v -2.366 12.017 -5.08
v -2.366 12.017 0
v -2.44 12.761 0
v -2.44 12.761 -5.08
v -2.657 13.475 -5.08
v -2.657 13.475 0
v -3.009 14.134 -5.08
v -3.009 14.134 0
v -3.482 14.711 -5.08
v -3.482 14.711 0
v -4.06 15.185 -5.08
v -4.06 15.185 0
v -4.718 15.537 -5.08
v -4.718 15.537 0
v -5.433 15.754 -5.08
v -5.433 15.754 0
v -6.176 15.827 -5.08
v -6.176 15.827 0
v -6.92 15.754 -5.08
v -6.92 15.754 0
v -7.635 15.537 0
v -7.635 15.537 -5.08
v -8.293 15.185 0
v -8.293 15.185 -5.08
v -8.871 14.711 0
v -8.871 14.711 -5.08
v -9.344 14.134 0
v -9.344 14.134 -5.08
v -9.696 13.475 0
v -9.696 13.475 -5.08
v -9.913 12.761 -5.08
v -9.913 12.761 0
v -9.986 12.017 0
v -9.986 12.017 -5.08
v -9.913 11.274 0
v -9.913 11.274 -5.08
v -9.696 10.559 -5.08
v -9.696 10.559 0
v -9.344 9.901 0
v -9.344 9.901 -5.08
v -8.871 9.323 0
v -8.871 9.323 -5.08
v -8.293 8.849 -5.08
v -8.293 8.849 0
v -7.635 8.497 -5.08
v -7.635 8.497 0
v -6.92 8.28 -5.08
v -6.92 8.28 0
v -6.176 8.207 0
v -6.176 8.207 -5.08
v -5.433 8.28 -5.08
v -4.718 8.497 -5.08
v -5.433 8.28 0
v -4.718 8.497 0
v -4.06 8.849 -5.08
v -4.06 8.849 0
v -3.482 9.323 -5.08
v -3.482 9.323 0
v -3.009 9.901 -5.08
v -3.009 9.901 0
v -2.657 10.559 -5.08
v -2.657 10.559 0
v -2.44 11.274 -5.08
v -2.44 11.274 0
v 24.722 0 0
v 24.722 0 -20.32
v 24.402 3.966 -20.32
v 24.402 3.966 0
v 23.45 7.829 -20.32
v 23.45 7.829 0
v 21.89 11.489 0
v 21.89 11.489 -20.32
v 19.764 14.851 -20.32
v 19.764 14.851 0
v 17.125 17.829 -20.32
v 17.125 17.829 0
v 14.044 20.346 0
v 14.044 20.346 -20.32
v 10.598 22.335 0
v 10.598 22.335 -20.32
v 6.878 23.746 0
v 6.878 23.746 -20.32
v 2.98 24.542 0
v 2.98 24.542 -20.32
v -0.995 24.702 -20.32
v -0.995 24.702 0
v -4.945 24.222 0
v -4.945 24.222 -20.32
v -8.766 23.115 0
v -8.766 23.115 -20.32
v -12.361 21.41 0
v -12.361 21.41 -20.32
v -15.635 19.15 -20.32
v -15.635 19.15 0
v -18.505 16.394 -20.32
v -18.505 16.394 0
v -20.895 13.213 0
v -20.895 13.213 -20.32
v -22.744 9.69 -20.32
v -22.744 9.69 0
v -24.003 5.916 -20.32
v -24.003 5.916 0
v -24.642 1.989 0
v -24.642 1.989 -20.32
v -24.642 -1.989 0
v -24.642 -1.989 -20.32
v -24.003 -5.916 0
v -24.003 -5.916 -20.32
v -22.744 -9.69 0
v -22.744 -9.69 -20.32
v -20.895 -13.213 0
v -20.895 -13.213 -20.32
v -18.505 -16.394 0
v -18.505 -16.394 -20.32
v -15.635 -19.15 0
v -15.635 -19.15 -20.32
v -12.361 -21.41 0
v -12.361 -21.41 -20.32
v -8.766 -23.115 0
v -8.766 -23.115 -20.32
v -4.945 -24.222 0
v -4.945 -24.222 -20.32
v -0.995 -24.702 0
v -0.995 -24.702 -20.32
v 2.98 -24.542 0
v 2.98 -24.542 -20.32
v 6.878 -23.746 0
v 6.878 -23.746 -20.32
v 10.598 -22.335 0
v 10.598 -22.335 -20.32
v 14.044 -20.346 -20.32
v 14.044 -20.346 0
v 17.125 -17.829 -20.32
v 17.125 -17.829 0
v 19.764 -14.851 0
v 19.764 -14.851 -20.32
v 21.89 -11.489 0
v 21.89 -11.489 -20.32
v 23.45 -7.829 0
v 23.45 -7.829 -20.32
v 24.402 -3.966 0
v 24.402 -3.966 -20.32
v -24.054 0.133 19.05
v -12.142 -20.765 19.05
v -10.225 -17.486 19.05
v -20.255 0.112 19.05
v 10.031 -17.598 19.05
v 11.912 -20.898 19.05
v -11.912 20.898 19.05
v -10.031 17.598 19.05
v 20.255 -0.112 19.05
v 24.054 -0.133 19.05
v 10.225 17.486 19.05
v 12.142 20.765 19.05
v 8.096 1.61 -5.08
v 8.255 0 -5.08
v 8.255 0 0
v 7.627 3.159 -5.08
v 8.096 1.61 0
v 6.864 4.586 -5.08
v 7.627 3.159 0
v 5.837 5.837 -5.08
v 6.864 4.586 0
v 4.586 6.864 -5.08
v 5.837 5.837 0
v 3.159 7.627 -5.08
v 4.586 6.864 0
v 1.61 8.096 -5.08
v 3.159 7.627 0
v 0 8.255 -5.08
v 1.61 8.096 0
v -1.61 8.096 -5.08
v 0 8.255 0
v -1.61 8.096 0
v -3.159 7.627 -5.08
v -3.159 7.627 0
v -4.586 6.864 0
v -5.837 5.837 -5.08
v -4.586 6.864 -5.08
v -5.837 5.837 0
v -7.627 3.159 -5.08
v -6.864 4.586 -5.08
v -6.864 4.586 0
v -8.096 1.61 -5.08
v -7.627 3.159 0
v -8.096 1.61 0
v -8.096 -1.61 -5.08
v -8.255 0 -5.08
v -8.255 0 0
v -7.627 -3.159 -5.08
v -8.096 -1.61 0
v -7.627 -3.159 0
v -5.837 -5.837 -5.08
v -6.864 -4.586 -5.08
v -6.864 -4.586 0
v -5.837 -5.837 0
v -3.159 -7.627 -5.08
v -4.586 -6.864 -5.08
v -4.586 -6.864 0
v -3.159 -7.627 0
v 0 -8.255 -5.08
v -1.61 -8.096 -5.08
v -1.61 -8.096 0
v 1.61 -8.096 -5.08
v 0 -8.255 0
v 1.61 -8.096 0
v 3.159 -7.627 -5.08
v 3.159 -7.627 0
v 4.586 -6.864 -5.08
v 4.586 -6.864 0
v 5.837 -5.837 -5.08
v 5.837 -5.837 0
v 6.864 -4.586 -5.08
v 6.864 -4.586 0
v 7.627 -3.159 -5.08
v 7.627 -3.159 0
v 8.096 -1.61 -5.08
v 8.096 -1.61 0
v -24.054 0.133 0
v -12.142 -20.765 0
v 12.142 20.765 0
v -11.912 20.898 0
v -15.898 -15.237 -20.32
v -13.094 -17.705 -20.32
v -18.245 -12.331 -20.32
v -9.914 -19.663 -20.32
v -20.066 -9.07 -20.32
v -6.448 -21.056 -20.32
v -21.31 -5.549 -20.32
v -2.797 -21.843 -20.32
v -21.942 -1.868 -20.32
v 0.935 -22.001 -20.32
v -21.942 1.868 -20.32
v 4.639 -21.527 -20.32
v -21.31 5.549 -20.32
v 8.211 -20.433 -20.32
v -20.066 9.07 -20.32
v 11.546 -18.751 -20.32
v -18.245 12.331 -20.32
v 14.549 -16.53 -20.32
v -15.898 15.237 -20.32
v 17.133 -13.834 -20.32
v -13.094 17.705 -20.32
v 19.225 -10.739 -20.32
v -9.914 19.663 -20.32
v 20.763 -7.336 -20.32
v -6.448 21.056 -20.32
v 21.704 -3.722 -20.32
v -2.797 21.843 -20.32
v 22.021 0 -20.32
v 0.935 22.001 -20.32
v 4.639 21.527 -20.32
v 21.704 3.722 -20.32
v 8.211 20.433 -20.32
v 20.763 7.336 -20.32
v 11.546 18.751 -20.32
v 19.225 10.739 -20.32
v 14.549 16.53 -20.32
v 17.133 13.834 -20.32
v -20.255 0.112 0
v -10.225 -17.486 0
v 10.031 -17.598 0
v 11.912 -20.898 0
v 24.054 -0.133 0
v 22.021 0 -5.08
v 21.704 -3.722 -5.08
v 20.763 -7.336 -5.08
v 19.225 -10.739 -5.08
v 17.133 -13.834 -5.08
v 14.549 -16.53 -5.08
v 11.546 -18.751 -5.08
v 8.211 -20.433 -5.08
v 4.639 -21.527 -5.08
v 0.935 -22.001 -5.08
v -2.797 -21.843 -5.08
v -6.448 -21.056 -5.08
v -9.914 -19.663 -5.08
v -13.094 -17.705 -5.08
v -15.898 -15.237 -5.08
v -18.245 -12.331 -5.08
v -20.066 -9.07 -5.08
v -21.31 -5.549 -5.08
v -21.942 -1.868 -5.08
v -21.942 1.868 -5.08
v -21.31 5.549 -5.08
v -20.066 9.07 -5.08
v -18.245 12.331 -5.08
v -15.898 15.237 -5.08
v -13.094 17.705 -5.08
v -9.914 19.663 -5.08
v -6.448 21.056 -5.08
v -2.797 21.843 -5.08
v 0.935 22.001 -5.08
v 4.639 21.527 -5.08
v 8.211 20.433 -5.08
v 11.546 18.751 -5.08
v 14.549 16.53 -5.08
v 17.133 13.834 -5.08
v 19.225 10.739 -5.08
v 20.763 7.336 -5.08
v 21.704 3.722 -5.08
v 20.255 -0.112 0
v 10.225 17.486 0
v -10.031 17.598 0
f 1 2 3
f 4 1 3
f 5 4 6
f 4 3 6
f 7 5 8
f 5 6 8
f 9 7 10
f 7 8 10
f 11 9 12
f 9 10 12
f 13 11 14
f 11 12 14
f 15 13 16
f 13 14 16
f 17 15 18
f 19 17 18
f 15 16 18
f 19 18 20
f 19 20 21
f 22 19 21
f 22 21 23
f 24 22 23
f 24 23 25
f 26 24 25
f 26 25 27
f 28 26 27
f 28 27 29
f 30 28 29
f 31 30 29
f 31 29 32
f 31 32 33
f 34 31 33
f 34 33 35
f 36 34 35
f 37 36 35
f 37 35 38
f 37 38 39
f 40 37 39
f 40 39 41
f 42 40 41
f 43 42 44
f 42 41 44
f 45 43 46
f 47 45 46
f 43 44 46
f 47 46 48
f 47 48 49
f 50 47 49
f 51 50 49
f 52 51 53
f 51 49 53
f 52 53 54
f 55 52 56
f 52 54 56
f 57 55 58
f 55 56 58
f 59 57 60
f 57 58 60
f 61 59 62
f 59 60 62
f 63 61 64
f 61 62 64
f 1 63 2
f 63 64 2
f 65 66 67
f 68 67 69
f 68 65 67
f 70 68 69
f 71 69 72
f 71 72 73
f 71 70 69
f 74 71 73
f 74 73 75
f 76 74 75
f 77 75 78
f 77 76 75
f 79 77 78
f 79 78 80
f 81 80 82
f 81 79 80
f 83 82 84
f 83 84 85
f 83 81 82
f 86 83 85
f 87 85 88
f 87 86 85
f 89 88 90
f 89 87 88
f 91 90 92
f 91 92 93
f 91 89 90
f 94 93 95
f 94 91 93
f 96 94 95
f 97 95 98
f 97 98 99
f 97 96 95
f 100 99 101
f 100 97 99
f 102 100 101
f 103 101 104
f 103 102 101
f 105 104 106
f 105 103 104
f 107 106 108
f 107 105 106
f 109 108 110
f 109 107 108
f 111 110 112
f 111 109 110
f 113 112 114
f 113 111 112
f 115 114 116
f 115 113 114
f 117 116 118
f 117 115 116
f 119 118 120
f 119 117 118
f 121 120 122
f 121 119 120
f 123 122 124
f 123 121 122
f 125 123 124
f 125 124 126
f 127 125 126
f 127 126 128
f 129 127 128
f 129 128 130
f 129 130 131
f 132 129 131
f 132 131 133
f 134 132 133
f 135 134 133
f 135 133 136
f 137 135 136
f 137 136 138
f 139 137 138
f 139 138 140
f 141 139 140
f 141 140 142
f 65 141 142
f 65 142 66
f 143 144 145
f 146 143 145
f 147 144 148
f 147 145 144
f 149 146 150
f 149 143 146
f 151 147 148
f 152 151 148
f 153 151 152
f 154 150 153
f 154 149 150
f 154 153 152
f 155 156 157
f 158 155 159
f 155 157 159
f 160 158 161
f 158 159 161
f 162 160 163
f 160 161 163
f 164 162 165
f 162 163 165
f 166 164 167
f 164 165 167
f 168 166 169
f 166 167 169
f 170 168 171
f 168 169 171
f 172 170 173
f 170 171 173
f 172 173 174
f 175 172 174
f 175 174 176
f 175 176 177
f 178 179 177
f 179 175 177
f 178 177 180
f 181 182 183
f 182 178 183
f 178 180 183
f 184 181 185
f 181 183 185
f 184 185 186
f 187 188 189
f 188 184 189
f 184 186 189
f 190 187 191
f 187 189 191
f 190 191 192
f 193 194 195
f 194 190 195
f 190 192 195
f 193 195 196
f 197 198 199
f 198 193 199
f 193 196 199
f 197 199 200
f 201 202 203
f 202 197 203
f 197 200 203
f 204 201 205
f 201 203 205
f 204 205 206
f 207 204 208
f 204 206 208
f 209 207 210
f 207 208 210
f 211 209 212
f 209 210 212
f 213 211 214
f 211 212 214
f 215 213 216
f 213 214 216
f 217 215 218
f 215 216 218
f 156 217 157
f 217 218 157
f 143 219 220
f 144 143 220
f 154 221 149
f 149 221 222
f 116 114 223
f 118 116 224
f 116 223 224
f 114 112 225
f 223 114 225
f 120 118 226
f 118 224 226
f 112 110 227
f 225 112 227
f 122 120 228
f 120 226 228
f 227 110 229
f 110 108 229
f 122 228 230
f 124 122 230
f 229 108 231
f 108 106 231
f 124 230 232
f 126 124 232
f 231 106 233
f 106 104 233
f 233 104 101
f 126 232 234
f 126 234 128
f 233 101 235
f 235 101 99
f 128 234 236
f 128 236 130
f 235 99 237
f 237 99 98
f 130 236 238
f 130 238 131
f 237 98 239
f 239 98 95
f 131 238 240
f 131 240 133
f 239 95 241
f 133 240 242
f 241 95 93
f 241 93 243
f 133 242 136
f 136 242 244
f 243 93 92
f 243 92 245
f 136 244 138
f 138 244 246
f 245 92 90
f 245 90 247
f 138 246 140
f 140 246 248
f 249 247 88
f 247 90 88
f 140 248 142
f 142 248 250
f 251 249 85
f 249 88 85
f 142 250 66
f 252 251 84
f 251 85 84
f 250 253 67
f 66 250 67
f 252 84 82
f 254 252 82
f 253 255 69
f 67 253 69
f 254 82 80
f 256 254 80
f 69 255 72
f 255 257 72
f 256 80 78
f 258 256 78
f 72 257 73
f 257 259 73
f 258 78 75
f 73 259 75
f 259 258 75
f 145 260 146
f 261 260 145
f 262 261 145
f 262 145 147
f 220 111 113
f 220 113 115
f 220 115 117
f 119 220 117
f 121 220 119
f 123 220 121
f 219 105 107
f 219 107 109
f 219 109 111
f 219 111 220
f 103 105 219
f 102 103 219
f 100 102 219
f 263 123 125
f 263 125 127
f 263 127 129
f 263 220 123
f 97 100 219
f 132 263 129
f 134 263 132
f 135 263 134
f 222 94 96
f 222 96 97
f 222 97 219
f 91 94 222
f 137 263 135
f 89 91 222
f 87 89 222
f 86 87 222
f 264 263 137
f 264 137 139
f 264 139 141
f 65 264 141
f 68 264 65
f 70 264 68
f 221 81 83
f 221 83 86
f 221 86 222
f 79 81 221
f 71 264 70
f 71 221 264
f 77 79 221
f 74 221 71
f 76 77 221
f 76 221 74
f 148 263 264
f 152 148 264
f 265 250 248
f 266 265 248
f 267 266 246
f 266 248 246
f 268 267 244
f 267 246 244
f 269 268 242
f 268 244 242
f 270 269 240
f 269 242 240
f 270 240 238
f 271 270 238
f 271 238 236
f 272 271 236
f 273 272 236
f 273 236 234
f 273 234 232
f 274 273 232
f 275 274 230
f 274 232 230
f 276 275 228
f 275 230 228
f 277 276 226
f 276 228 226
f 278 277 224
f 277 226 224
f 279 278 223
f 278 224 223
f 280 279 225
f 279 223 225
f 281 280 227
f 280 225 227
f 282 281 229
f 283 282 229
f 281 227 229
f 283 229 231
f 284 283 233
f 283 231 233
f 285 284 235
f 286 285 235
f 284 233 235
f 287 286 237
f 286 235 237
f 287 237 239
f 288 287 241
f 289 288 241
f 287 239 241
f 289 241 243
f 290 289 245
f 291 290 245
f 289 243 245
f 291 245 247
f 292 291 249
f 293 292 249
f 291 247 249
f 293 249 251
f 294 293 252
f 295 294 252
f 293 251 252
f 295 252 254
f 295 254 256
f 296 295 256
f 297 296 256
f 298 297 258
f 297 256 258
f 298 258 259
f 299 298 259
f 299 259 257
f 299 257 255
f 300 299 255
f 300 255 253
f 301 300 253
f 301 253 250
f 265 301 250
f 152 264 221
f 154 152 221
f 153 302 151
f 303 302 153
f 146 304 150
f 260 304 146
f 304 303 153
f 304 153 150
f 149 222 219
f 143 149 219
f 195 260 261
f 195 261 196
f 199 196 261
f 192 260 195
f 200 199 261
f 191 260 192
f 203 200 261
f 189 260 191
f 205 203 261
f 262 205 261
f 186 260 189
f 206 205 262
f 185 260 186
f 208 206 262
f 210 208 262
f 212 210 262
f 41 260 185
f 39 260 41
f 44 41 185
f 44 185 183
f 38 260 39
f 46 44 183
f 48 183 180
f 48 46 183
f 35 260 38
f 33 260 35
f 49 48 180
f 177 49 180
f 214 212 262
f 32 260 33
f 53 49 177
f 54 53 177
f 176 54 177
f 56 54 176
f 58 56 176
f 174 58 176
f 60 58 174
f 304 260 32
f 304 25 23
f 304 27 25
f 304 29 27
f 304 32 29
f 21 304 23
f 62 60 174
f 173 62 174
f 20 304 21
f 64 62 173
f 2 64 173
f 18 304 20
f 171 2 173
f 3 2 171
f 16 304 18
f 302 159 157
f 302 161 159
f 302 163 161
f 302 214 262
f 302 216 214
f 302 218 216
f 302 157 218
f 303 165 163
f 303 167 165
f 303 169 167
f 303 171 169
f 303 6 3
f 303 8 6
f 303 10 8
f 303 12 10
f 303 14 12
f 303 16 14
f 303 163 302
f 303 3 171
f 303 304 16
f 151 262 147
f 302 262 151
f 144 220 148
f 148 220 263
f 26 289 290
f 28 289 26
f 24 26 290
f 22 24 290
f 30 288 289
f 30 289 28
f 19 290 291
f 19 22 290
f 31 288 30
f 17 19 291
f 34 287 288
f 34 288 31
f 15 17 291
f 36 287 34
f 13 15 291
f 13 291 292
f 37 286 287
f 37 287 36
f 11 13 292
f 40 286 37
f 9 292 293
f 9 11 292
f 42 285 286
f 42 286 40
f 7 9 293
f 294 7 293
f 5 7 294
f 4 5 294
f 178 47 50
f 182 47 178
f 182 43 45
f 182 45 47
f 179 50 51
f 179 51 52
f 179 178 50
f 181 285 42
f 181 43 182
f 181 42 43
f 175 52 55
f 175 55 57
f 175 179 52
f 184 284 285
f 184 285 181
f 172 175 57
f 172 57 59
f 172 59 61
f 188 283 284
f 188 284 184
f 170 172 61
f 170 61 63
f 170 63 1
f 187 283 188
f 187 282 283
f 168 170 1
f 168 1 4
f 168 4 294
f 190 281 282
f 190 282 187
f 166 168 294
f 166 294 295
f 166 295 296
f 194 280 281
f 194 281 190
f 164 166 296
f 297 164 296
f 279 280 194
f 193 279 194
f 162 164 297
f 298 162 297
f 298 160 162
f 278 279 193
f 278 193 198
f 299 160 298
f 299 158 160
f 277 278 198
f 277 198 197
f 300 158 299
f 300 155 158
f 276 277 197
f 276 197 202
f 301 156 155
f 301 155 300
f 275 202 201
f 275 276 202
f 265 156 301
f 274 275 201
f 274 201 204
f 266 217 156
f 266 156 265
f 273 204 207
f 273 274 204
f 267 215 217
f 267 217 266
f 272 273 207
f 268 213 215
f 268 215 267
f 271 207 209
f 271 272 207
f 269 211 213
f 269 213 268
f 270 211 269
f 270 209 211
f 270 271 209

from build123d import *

# Parameters (mm, degrees)
F2_DEPTH  = 19.05
F3_DEPTH  = 67.818
F4_R      = 24.7218142408
F5_DEPTH  = 2.54
F6_R      = 8.255
F7_DEPTH  = 60.706
F8_DEPTH  = 17.78
F9_R      = 22.0208797998
F9_R_2    = 8.255
F10_DEPTH = 15.24
F11_R     = 3.81
F12_DEPTH = 25.4


with BuildPart() as f2:
    # F0 (on Top) → F2 (new body)
    with BuildSketch(Plane.XY):
        Polygon((11.9120152821, -20.8982058203), (24.0543847749, -0.1329950655), (12.1423694928, 20.7652107547), (-11.9120152821, 20.8982058203), (-24.0543847749, 0.1329950655), (-12.1423694928, -20.7652107547), align=None)
    extrude(amount=F2_DEPTH)

    # F1 (on face) → F3 (cut)
    with BuildSketch(Plane.XY):
        Polygon((20.2553256916, -0.1120183326), (10.2246735675, 17.4856174446), (-10.0306521241, 17.5976357771), (-20.2553256916, 0.1120183326), (-10.2246735675, -17.4856174446), (10.0306521241, -17.5976357771), align=None)
    extrude(amount=F3_DEPTH, mode=Mode.SUBTRACT)

    # F4 (on Top) → F5 (join)
    with BuildSketch(Plane.XY):
        Circle(F4_R)
    extrude(amount=-F5_DEPTH)

    # F6 (on face) → F7 (cut)
    with BuildSketch(Plane.XY):
        Circle(F6_R)
    extrude(amount=-F7_DEPTH, mode=Mode.SUBTRACT)

    # F8 (add): a face of the model
    f8_faces = [f2.faces().sort_by_distance(p)[0] for p in [
        (-24.0225757411, 0, -2.54),
    ]]
    extrude(f8_faces, amount=F8_DEPTH)

    # F9 (on face) → F10 (cut)
    with BuildSketch(Plane(origin=(0, 0, -20.32), x_dir=(1, 0, 0), z_dir=(0, 0, -1))):
        Circle(F9_R)
        Circle(F9_R_2, mode=Mode.SUBTRACT)
    extrude(amount=-F10_DEPTH, mode=Mode.SUBTRACT)

    # F11 (on face) → F12 (cut)
    with BuildSketch(Plane.XY):
        with Locations((-6.1764977872, 12.0172752067)):
            Circle(F11_R)
    extrude(amount=-F12_DEPTH, mode=Mode.SUBTRACT)


solid = f2.part
